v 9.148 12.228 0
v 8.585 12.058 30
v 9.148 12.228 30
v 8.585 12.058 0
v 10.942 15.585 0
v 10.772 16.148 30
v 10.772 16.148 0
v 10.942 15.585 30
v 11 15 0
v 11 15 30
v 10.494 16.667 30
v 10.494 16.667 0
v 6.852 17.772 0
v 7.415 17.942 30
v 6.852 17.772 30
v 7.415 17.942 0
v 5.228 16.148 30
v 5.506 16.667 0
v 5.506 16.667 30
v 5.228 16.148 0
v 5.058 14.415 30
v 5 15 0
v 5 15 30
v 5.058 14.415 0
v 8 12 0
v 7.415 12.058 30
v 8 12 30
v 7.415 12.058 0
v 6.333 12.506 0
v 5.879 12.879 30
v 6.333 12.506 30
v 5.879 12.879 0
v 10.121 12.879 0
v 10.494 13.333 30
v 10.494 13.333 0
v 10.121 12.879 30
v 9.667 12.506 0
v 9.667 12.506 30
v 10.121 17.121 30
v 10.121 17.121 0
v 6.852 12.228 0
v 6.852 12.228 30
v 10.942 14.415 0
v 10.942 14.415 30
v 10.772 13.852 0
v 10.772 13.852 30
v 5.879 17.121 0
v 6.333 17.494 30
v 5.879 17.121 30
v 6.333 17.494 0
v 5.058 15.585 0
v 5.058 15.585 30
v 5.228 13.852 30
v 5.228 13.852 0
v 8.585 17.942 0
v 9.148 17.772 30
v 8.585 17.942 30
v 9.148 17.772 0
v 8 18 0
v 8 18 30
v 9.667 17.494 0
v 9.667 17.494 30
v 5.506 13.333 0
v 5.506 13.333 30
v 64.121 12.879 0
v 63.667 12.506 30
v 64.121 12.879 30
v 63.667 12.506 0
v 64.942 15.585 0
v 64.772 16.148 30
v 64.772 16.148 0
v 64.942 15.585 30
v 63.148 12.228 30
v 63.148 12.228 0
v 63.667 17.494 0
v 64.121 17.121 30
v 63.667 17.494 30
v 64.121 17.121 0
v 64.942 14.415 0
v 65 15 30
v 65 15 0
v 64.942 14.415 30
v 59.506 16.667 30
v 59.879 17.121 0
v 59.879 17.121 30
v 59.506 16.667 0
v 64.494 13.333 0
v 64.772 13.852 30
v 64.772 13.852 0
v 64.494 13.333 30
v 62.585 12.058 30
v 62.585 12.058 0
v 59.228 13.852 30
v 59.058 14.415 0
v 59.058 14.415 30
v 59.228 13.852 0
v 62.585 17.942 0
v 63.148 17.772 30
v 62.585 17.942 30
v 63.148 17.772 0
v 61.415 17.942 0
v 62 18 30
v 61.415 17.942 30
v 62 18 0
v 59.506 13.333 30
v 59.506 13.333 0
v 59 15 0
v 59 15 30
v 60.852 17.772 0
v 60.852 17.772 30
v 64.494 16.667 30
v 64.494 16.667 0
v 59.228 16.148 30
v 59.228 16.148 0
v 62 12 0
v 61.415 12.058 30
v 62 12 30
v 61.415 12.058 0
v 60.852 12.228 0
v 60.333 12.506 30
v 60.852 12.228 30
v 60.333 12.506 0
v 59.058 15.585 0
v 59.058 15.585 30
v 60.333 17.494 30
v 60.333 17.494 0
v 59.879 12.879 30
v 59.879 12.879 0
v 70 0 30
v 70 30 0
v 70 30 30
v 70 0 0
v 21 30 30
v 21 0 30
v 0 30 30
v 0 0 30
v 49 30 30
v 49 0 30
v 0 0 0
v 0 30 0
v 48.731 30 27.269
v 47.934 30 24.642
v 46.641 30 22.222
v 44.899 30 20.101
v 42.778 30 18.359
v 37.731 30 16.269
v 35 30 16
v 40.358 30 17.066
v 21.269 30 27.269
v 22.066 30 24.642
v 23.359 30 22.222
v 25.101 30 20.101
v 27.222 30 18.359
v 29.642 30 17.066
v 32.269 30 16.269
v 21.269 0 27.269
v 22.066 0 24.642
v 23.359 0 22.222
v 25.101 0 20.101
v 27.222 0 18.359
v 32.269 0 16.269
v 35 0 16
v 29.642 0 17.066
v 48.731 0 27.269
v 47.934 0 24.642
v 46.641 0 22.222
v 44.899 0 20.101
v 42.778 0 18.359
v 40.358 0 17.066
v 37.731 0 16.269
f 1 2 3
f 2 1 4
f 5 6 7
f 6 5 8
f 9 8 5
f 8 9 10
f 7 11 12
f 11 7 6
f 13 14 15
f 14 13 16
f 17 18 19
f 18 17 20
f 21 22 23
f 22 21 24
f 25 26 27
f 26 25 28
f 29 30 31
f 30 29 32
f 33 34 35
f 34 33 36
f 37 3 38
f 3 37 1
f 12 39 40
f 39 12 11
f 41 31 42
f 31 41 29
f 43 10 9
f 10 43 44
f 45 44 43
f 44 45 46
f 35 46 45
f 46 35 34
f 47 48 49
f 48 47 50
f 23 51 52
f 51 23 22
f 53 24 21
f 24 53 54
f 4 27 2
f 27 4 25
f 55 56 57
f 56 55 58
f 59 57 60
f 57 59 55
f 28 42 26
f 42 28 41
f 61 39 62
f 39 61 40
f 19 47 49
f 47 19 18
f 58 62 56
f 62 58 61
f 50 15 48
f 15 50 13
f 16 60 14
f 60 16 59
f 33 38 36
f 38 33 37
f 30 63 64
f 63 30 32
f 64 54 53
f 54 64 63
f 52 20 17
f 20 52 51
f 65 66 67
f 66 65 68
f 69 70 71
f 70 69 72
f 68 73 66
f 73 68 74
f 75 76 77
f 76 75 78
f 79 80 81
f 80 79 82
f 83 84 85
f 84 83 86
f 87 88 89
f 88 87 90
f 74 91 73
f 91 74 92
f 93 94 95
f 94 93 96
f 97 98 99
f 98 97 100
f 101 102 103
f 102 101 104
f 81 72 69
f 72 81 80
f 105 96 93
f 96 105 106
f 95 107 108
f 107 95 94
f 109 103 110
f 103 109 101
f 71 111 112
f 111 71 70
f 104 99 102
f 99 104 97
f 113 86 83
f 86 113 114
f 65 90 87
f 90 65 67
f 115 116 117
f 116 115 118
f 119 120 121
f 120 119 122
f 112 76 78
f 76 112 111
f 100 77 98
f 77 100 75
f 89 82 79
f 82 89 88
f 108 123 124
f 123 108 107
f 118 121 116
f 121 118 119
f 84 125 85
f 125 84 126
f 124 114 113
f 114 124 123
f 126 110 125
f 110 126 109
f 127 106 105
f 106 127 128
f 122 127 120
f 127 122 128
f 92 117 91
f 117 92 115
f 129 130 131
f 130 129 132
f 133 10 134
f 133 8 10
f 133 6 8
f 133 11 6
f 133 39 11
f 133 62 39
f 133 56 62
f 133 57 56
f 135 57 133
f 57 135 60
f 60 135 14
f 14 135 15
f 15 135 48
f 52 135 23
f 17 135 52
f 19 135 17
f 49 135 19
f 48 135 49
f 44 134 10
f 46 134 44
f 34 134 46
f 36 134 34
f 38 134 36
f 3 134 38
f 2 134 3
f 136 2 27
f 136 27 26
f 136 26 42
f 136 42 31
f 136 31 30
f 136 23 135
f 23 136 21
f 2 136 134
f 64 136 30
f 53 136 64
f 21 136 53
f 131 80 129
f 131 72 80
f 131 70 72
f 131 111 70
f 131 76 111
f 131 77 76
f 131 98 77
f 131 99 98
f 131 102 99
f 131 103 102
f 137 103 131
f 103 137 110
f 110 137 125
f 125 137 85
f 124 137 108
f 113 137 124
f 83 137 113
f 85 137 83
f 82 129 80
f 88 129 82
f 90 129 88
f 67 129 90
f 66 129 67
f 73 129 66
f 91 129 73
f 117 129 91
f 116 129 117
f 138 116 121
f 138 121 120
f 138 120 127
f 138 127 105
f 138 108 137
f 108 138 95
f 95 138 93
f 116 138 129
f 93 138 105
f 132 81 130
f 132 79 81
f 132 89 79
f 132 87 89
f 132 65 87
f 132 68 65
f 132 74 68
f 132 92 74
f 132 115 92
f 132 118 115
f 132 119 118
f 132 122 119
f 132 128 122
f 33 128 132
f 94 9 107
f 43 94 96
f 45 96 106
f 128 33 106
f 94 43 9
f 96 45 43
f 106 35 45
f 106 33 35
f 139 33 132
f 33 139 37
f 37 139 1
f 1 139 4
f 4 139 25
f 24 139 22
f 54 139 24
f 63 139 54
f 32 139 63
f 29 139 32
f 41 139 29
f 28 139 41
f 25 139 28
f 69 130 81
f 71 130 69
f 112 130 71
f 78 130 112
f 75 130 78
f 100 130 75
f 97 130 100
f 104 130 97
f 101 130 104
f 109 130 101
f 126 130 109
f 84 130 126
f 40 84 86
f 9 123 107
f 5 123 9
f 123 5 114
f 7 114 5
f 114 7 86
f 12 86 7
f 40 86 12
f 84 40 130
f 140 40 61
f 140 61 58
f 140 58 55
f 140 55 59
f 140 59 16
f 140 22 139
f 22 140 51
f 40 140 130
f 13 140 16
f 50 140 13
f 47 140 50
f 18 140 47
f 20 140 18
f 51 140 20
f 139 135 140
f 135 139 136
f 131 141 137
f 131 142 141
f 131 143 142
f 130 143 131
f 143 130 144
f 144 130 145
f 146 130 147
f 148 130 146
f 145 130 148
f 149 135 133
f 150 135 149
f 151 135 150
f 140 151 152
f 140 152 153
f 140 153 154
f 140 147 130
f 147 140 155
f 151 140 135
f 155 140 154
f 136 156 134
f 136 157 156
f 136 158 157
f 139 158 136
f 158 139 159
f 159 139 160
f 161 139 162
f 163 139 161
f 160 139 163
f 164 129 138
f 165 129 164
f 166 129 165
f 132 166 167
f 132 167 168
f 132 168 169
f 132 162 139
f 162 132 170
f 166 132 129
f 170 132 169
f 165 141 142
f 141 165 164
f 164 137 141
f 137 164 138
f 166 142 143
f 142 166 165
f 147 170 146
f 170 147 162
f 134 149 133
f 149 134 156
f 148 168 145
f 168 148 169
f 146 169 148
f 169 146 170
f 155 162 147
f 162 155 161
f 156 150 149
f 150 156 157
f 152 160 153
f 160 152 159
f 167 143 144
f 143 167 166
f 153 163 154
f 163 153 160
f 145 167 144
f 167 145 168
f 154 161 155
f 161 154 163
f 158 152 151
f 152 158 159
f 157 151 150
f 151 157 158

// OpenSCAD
$fn = 32;

// ----------------------------------------------------------------------
// Saddle clamp: plain shaft clamp
// ----------------------------------------------------------------------

// --- parameters (mm) ---
blk_l = 70;               // block length, X
blk_w = 30;               // block width, Y
blk_h = 30;               // block height
clamp_r = 14;             // shaft groove radius
hole_r = 3;               // bolt hole radius
hole_m = 8;               // bolt hole margin from the ends
fit_tol = 0.1;            // tolerance for press fits, mm
free_tol = 0.3;           // tolerance for clearance fits, mm

saw_depth = clamp_r + 3;  // saw kerf depth

difference() {
  cube([blk_l, blk_w, blk_h]);
  translate([blk_l / 2, -1, blk_h])
    rotate([-90, 0, 0])
      cylinder(h = blk_w + 2, r = clamp_r);
  for (sx = [0, 1])
    translate([sx ? blk_l - hole_m : hole_m, blk_w / 2, -1])
      cylinder(r = hole_r, h = blk_h + 2);
}
